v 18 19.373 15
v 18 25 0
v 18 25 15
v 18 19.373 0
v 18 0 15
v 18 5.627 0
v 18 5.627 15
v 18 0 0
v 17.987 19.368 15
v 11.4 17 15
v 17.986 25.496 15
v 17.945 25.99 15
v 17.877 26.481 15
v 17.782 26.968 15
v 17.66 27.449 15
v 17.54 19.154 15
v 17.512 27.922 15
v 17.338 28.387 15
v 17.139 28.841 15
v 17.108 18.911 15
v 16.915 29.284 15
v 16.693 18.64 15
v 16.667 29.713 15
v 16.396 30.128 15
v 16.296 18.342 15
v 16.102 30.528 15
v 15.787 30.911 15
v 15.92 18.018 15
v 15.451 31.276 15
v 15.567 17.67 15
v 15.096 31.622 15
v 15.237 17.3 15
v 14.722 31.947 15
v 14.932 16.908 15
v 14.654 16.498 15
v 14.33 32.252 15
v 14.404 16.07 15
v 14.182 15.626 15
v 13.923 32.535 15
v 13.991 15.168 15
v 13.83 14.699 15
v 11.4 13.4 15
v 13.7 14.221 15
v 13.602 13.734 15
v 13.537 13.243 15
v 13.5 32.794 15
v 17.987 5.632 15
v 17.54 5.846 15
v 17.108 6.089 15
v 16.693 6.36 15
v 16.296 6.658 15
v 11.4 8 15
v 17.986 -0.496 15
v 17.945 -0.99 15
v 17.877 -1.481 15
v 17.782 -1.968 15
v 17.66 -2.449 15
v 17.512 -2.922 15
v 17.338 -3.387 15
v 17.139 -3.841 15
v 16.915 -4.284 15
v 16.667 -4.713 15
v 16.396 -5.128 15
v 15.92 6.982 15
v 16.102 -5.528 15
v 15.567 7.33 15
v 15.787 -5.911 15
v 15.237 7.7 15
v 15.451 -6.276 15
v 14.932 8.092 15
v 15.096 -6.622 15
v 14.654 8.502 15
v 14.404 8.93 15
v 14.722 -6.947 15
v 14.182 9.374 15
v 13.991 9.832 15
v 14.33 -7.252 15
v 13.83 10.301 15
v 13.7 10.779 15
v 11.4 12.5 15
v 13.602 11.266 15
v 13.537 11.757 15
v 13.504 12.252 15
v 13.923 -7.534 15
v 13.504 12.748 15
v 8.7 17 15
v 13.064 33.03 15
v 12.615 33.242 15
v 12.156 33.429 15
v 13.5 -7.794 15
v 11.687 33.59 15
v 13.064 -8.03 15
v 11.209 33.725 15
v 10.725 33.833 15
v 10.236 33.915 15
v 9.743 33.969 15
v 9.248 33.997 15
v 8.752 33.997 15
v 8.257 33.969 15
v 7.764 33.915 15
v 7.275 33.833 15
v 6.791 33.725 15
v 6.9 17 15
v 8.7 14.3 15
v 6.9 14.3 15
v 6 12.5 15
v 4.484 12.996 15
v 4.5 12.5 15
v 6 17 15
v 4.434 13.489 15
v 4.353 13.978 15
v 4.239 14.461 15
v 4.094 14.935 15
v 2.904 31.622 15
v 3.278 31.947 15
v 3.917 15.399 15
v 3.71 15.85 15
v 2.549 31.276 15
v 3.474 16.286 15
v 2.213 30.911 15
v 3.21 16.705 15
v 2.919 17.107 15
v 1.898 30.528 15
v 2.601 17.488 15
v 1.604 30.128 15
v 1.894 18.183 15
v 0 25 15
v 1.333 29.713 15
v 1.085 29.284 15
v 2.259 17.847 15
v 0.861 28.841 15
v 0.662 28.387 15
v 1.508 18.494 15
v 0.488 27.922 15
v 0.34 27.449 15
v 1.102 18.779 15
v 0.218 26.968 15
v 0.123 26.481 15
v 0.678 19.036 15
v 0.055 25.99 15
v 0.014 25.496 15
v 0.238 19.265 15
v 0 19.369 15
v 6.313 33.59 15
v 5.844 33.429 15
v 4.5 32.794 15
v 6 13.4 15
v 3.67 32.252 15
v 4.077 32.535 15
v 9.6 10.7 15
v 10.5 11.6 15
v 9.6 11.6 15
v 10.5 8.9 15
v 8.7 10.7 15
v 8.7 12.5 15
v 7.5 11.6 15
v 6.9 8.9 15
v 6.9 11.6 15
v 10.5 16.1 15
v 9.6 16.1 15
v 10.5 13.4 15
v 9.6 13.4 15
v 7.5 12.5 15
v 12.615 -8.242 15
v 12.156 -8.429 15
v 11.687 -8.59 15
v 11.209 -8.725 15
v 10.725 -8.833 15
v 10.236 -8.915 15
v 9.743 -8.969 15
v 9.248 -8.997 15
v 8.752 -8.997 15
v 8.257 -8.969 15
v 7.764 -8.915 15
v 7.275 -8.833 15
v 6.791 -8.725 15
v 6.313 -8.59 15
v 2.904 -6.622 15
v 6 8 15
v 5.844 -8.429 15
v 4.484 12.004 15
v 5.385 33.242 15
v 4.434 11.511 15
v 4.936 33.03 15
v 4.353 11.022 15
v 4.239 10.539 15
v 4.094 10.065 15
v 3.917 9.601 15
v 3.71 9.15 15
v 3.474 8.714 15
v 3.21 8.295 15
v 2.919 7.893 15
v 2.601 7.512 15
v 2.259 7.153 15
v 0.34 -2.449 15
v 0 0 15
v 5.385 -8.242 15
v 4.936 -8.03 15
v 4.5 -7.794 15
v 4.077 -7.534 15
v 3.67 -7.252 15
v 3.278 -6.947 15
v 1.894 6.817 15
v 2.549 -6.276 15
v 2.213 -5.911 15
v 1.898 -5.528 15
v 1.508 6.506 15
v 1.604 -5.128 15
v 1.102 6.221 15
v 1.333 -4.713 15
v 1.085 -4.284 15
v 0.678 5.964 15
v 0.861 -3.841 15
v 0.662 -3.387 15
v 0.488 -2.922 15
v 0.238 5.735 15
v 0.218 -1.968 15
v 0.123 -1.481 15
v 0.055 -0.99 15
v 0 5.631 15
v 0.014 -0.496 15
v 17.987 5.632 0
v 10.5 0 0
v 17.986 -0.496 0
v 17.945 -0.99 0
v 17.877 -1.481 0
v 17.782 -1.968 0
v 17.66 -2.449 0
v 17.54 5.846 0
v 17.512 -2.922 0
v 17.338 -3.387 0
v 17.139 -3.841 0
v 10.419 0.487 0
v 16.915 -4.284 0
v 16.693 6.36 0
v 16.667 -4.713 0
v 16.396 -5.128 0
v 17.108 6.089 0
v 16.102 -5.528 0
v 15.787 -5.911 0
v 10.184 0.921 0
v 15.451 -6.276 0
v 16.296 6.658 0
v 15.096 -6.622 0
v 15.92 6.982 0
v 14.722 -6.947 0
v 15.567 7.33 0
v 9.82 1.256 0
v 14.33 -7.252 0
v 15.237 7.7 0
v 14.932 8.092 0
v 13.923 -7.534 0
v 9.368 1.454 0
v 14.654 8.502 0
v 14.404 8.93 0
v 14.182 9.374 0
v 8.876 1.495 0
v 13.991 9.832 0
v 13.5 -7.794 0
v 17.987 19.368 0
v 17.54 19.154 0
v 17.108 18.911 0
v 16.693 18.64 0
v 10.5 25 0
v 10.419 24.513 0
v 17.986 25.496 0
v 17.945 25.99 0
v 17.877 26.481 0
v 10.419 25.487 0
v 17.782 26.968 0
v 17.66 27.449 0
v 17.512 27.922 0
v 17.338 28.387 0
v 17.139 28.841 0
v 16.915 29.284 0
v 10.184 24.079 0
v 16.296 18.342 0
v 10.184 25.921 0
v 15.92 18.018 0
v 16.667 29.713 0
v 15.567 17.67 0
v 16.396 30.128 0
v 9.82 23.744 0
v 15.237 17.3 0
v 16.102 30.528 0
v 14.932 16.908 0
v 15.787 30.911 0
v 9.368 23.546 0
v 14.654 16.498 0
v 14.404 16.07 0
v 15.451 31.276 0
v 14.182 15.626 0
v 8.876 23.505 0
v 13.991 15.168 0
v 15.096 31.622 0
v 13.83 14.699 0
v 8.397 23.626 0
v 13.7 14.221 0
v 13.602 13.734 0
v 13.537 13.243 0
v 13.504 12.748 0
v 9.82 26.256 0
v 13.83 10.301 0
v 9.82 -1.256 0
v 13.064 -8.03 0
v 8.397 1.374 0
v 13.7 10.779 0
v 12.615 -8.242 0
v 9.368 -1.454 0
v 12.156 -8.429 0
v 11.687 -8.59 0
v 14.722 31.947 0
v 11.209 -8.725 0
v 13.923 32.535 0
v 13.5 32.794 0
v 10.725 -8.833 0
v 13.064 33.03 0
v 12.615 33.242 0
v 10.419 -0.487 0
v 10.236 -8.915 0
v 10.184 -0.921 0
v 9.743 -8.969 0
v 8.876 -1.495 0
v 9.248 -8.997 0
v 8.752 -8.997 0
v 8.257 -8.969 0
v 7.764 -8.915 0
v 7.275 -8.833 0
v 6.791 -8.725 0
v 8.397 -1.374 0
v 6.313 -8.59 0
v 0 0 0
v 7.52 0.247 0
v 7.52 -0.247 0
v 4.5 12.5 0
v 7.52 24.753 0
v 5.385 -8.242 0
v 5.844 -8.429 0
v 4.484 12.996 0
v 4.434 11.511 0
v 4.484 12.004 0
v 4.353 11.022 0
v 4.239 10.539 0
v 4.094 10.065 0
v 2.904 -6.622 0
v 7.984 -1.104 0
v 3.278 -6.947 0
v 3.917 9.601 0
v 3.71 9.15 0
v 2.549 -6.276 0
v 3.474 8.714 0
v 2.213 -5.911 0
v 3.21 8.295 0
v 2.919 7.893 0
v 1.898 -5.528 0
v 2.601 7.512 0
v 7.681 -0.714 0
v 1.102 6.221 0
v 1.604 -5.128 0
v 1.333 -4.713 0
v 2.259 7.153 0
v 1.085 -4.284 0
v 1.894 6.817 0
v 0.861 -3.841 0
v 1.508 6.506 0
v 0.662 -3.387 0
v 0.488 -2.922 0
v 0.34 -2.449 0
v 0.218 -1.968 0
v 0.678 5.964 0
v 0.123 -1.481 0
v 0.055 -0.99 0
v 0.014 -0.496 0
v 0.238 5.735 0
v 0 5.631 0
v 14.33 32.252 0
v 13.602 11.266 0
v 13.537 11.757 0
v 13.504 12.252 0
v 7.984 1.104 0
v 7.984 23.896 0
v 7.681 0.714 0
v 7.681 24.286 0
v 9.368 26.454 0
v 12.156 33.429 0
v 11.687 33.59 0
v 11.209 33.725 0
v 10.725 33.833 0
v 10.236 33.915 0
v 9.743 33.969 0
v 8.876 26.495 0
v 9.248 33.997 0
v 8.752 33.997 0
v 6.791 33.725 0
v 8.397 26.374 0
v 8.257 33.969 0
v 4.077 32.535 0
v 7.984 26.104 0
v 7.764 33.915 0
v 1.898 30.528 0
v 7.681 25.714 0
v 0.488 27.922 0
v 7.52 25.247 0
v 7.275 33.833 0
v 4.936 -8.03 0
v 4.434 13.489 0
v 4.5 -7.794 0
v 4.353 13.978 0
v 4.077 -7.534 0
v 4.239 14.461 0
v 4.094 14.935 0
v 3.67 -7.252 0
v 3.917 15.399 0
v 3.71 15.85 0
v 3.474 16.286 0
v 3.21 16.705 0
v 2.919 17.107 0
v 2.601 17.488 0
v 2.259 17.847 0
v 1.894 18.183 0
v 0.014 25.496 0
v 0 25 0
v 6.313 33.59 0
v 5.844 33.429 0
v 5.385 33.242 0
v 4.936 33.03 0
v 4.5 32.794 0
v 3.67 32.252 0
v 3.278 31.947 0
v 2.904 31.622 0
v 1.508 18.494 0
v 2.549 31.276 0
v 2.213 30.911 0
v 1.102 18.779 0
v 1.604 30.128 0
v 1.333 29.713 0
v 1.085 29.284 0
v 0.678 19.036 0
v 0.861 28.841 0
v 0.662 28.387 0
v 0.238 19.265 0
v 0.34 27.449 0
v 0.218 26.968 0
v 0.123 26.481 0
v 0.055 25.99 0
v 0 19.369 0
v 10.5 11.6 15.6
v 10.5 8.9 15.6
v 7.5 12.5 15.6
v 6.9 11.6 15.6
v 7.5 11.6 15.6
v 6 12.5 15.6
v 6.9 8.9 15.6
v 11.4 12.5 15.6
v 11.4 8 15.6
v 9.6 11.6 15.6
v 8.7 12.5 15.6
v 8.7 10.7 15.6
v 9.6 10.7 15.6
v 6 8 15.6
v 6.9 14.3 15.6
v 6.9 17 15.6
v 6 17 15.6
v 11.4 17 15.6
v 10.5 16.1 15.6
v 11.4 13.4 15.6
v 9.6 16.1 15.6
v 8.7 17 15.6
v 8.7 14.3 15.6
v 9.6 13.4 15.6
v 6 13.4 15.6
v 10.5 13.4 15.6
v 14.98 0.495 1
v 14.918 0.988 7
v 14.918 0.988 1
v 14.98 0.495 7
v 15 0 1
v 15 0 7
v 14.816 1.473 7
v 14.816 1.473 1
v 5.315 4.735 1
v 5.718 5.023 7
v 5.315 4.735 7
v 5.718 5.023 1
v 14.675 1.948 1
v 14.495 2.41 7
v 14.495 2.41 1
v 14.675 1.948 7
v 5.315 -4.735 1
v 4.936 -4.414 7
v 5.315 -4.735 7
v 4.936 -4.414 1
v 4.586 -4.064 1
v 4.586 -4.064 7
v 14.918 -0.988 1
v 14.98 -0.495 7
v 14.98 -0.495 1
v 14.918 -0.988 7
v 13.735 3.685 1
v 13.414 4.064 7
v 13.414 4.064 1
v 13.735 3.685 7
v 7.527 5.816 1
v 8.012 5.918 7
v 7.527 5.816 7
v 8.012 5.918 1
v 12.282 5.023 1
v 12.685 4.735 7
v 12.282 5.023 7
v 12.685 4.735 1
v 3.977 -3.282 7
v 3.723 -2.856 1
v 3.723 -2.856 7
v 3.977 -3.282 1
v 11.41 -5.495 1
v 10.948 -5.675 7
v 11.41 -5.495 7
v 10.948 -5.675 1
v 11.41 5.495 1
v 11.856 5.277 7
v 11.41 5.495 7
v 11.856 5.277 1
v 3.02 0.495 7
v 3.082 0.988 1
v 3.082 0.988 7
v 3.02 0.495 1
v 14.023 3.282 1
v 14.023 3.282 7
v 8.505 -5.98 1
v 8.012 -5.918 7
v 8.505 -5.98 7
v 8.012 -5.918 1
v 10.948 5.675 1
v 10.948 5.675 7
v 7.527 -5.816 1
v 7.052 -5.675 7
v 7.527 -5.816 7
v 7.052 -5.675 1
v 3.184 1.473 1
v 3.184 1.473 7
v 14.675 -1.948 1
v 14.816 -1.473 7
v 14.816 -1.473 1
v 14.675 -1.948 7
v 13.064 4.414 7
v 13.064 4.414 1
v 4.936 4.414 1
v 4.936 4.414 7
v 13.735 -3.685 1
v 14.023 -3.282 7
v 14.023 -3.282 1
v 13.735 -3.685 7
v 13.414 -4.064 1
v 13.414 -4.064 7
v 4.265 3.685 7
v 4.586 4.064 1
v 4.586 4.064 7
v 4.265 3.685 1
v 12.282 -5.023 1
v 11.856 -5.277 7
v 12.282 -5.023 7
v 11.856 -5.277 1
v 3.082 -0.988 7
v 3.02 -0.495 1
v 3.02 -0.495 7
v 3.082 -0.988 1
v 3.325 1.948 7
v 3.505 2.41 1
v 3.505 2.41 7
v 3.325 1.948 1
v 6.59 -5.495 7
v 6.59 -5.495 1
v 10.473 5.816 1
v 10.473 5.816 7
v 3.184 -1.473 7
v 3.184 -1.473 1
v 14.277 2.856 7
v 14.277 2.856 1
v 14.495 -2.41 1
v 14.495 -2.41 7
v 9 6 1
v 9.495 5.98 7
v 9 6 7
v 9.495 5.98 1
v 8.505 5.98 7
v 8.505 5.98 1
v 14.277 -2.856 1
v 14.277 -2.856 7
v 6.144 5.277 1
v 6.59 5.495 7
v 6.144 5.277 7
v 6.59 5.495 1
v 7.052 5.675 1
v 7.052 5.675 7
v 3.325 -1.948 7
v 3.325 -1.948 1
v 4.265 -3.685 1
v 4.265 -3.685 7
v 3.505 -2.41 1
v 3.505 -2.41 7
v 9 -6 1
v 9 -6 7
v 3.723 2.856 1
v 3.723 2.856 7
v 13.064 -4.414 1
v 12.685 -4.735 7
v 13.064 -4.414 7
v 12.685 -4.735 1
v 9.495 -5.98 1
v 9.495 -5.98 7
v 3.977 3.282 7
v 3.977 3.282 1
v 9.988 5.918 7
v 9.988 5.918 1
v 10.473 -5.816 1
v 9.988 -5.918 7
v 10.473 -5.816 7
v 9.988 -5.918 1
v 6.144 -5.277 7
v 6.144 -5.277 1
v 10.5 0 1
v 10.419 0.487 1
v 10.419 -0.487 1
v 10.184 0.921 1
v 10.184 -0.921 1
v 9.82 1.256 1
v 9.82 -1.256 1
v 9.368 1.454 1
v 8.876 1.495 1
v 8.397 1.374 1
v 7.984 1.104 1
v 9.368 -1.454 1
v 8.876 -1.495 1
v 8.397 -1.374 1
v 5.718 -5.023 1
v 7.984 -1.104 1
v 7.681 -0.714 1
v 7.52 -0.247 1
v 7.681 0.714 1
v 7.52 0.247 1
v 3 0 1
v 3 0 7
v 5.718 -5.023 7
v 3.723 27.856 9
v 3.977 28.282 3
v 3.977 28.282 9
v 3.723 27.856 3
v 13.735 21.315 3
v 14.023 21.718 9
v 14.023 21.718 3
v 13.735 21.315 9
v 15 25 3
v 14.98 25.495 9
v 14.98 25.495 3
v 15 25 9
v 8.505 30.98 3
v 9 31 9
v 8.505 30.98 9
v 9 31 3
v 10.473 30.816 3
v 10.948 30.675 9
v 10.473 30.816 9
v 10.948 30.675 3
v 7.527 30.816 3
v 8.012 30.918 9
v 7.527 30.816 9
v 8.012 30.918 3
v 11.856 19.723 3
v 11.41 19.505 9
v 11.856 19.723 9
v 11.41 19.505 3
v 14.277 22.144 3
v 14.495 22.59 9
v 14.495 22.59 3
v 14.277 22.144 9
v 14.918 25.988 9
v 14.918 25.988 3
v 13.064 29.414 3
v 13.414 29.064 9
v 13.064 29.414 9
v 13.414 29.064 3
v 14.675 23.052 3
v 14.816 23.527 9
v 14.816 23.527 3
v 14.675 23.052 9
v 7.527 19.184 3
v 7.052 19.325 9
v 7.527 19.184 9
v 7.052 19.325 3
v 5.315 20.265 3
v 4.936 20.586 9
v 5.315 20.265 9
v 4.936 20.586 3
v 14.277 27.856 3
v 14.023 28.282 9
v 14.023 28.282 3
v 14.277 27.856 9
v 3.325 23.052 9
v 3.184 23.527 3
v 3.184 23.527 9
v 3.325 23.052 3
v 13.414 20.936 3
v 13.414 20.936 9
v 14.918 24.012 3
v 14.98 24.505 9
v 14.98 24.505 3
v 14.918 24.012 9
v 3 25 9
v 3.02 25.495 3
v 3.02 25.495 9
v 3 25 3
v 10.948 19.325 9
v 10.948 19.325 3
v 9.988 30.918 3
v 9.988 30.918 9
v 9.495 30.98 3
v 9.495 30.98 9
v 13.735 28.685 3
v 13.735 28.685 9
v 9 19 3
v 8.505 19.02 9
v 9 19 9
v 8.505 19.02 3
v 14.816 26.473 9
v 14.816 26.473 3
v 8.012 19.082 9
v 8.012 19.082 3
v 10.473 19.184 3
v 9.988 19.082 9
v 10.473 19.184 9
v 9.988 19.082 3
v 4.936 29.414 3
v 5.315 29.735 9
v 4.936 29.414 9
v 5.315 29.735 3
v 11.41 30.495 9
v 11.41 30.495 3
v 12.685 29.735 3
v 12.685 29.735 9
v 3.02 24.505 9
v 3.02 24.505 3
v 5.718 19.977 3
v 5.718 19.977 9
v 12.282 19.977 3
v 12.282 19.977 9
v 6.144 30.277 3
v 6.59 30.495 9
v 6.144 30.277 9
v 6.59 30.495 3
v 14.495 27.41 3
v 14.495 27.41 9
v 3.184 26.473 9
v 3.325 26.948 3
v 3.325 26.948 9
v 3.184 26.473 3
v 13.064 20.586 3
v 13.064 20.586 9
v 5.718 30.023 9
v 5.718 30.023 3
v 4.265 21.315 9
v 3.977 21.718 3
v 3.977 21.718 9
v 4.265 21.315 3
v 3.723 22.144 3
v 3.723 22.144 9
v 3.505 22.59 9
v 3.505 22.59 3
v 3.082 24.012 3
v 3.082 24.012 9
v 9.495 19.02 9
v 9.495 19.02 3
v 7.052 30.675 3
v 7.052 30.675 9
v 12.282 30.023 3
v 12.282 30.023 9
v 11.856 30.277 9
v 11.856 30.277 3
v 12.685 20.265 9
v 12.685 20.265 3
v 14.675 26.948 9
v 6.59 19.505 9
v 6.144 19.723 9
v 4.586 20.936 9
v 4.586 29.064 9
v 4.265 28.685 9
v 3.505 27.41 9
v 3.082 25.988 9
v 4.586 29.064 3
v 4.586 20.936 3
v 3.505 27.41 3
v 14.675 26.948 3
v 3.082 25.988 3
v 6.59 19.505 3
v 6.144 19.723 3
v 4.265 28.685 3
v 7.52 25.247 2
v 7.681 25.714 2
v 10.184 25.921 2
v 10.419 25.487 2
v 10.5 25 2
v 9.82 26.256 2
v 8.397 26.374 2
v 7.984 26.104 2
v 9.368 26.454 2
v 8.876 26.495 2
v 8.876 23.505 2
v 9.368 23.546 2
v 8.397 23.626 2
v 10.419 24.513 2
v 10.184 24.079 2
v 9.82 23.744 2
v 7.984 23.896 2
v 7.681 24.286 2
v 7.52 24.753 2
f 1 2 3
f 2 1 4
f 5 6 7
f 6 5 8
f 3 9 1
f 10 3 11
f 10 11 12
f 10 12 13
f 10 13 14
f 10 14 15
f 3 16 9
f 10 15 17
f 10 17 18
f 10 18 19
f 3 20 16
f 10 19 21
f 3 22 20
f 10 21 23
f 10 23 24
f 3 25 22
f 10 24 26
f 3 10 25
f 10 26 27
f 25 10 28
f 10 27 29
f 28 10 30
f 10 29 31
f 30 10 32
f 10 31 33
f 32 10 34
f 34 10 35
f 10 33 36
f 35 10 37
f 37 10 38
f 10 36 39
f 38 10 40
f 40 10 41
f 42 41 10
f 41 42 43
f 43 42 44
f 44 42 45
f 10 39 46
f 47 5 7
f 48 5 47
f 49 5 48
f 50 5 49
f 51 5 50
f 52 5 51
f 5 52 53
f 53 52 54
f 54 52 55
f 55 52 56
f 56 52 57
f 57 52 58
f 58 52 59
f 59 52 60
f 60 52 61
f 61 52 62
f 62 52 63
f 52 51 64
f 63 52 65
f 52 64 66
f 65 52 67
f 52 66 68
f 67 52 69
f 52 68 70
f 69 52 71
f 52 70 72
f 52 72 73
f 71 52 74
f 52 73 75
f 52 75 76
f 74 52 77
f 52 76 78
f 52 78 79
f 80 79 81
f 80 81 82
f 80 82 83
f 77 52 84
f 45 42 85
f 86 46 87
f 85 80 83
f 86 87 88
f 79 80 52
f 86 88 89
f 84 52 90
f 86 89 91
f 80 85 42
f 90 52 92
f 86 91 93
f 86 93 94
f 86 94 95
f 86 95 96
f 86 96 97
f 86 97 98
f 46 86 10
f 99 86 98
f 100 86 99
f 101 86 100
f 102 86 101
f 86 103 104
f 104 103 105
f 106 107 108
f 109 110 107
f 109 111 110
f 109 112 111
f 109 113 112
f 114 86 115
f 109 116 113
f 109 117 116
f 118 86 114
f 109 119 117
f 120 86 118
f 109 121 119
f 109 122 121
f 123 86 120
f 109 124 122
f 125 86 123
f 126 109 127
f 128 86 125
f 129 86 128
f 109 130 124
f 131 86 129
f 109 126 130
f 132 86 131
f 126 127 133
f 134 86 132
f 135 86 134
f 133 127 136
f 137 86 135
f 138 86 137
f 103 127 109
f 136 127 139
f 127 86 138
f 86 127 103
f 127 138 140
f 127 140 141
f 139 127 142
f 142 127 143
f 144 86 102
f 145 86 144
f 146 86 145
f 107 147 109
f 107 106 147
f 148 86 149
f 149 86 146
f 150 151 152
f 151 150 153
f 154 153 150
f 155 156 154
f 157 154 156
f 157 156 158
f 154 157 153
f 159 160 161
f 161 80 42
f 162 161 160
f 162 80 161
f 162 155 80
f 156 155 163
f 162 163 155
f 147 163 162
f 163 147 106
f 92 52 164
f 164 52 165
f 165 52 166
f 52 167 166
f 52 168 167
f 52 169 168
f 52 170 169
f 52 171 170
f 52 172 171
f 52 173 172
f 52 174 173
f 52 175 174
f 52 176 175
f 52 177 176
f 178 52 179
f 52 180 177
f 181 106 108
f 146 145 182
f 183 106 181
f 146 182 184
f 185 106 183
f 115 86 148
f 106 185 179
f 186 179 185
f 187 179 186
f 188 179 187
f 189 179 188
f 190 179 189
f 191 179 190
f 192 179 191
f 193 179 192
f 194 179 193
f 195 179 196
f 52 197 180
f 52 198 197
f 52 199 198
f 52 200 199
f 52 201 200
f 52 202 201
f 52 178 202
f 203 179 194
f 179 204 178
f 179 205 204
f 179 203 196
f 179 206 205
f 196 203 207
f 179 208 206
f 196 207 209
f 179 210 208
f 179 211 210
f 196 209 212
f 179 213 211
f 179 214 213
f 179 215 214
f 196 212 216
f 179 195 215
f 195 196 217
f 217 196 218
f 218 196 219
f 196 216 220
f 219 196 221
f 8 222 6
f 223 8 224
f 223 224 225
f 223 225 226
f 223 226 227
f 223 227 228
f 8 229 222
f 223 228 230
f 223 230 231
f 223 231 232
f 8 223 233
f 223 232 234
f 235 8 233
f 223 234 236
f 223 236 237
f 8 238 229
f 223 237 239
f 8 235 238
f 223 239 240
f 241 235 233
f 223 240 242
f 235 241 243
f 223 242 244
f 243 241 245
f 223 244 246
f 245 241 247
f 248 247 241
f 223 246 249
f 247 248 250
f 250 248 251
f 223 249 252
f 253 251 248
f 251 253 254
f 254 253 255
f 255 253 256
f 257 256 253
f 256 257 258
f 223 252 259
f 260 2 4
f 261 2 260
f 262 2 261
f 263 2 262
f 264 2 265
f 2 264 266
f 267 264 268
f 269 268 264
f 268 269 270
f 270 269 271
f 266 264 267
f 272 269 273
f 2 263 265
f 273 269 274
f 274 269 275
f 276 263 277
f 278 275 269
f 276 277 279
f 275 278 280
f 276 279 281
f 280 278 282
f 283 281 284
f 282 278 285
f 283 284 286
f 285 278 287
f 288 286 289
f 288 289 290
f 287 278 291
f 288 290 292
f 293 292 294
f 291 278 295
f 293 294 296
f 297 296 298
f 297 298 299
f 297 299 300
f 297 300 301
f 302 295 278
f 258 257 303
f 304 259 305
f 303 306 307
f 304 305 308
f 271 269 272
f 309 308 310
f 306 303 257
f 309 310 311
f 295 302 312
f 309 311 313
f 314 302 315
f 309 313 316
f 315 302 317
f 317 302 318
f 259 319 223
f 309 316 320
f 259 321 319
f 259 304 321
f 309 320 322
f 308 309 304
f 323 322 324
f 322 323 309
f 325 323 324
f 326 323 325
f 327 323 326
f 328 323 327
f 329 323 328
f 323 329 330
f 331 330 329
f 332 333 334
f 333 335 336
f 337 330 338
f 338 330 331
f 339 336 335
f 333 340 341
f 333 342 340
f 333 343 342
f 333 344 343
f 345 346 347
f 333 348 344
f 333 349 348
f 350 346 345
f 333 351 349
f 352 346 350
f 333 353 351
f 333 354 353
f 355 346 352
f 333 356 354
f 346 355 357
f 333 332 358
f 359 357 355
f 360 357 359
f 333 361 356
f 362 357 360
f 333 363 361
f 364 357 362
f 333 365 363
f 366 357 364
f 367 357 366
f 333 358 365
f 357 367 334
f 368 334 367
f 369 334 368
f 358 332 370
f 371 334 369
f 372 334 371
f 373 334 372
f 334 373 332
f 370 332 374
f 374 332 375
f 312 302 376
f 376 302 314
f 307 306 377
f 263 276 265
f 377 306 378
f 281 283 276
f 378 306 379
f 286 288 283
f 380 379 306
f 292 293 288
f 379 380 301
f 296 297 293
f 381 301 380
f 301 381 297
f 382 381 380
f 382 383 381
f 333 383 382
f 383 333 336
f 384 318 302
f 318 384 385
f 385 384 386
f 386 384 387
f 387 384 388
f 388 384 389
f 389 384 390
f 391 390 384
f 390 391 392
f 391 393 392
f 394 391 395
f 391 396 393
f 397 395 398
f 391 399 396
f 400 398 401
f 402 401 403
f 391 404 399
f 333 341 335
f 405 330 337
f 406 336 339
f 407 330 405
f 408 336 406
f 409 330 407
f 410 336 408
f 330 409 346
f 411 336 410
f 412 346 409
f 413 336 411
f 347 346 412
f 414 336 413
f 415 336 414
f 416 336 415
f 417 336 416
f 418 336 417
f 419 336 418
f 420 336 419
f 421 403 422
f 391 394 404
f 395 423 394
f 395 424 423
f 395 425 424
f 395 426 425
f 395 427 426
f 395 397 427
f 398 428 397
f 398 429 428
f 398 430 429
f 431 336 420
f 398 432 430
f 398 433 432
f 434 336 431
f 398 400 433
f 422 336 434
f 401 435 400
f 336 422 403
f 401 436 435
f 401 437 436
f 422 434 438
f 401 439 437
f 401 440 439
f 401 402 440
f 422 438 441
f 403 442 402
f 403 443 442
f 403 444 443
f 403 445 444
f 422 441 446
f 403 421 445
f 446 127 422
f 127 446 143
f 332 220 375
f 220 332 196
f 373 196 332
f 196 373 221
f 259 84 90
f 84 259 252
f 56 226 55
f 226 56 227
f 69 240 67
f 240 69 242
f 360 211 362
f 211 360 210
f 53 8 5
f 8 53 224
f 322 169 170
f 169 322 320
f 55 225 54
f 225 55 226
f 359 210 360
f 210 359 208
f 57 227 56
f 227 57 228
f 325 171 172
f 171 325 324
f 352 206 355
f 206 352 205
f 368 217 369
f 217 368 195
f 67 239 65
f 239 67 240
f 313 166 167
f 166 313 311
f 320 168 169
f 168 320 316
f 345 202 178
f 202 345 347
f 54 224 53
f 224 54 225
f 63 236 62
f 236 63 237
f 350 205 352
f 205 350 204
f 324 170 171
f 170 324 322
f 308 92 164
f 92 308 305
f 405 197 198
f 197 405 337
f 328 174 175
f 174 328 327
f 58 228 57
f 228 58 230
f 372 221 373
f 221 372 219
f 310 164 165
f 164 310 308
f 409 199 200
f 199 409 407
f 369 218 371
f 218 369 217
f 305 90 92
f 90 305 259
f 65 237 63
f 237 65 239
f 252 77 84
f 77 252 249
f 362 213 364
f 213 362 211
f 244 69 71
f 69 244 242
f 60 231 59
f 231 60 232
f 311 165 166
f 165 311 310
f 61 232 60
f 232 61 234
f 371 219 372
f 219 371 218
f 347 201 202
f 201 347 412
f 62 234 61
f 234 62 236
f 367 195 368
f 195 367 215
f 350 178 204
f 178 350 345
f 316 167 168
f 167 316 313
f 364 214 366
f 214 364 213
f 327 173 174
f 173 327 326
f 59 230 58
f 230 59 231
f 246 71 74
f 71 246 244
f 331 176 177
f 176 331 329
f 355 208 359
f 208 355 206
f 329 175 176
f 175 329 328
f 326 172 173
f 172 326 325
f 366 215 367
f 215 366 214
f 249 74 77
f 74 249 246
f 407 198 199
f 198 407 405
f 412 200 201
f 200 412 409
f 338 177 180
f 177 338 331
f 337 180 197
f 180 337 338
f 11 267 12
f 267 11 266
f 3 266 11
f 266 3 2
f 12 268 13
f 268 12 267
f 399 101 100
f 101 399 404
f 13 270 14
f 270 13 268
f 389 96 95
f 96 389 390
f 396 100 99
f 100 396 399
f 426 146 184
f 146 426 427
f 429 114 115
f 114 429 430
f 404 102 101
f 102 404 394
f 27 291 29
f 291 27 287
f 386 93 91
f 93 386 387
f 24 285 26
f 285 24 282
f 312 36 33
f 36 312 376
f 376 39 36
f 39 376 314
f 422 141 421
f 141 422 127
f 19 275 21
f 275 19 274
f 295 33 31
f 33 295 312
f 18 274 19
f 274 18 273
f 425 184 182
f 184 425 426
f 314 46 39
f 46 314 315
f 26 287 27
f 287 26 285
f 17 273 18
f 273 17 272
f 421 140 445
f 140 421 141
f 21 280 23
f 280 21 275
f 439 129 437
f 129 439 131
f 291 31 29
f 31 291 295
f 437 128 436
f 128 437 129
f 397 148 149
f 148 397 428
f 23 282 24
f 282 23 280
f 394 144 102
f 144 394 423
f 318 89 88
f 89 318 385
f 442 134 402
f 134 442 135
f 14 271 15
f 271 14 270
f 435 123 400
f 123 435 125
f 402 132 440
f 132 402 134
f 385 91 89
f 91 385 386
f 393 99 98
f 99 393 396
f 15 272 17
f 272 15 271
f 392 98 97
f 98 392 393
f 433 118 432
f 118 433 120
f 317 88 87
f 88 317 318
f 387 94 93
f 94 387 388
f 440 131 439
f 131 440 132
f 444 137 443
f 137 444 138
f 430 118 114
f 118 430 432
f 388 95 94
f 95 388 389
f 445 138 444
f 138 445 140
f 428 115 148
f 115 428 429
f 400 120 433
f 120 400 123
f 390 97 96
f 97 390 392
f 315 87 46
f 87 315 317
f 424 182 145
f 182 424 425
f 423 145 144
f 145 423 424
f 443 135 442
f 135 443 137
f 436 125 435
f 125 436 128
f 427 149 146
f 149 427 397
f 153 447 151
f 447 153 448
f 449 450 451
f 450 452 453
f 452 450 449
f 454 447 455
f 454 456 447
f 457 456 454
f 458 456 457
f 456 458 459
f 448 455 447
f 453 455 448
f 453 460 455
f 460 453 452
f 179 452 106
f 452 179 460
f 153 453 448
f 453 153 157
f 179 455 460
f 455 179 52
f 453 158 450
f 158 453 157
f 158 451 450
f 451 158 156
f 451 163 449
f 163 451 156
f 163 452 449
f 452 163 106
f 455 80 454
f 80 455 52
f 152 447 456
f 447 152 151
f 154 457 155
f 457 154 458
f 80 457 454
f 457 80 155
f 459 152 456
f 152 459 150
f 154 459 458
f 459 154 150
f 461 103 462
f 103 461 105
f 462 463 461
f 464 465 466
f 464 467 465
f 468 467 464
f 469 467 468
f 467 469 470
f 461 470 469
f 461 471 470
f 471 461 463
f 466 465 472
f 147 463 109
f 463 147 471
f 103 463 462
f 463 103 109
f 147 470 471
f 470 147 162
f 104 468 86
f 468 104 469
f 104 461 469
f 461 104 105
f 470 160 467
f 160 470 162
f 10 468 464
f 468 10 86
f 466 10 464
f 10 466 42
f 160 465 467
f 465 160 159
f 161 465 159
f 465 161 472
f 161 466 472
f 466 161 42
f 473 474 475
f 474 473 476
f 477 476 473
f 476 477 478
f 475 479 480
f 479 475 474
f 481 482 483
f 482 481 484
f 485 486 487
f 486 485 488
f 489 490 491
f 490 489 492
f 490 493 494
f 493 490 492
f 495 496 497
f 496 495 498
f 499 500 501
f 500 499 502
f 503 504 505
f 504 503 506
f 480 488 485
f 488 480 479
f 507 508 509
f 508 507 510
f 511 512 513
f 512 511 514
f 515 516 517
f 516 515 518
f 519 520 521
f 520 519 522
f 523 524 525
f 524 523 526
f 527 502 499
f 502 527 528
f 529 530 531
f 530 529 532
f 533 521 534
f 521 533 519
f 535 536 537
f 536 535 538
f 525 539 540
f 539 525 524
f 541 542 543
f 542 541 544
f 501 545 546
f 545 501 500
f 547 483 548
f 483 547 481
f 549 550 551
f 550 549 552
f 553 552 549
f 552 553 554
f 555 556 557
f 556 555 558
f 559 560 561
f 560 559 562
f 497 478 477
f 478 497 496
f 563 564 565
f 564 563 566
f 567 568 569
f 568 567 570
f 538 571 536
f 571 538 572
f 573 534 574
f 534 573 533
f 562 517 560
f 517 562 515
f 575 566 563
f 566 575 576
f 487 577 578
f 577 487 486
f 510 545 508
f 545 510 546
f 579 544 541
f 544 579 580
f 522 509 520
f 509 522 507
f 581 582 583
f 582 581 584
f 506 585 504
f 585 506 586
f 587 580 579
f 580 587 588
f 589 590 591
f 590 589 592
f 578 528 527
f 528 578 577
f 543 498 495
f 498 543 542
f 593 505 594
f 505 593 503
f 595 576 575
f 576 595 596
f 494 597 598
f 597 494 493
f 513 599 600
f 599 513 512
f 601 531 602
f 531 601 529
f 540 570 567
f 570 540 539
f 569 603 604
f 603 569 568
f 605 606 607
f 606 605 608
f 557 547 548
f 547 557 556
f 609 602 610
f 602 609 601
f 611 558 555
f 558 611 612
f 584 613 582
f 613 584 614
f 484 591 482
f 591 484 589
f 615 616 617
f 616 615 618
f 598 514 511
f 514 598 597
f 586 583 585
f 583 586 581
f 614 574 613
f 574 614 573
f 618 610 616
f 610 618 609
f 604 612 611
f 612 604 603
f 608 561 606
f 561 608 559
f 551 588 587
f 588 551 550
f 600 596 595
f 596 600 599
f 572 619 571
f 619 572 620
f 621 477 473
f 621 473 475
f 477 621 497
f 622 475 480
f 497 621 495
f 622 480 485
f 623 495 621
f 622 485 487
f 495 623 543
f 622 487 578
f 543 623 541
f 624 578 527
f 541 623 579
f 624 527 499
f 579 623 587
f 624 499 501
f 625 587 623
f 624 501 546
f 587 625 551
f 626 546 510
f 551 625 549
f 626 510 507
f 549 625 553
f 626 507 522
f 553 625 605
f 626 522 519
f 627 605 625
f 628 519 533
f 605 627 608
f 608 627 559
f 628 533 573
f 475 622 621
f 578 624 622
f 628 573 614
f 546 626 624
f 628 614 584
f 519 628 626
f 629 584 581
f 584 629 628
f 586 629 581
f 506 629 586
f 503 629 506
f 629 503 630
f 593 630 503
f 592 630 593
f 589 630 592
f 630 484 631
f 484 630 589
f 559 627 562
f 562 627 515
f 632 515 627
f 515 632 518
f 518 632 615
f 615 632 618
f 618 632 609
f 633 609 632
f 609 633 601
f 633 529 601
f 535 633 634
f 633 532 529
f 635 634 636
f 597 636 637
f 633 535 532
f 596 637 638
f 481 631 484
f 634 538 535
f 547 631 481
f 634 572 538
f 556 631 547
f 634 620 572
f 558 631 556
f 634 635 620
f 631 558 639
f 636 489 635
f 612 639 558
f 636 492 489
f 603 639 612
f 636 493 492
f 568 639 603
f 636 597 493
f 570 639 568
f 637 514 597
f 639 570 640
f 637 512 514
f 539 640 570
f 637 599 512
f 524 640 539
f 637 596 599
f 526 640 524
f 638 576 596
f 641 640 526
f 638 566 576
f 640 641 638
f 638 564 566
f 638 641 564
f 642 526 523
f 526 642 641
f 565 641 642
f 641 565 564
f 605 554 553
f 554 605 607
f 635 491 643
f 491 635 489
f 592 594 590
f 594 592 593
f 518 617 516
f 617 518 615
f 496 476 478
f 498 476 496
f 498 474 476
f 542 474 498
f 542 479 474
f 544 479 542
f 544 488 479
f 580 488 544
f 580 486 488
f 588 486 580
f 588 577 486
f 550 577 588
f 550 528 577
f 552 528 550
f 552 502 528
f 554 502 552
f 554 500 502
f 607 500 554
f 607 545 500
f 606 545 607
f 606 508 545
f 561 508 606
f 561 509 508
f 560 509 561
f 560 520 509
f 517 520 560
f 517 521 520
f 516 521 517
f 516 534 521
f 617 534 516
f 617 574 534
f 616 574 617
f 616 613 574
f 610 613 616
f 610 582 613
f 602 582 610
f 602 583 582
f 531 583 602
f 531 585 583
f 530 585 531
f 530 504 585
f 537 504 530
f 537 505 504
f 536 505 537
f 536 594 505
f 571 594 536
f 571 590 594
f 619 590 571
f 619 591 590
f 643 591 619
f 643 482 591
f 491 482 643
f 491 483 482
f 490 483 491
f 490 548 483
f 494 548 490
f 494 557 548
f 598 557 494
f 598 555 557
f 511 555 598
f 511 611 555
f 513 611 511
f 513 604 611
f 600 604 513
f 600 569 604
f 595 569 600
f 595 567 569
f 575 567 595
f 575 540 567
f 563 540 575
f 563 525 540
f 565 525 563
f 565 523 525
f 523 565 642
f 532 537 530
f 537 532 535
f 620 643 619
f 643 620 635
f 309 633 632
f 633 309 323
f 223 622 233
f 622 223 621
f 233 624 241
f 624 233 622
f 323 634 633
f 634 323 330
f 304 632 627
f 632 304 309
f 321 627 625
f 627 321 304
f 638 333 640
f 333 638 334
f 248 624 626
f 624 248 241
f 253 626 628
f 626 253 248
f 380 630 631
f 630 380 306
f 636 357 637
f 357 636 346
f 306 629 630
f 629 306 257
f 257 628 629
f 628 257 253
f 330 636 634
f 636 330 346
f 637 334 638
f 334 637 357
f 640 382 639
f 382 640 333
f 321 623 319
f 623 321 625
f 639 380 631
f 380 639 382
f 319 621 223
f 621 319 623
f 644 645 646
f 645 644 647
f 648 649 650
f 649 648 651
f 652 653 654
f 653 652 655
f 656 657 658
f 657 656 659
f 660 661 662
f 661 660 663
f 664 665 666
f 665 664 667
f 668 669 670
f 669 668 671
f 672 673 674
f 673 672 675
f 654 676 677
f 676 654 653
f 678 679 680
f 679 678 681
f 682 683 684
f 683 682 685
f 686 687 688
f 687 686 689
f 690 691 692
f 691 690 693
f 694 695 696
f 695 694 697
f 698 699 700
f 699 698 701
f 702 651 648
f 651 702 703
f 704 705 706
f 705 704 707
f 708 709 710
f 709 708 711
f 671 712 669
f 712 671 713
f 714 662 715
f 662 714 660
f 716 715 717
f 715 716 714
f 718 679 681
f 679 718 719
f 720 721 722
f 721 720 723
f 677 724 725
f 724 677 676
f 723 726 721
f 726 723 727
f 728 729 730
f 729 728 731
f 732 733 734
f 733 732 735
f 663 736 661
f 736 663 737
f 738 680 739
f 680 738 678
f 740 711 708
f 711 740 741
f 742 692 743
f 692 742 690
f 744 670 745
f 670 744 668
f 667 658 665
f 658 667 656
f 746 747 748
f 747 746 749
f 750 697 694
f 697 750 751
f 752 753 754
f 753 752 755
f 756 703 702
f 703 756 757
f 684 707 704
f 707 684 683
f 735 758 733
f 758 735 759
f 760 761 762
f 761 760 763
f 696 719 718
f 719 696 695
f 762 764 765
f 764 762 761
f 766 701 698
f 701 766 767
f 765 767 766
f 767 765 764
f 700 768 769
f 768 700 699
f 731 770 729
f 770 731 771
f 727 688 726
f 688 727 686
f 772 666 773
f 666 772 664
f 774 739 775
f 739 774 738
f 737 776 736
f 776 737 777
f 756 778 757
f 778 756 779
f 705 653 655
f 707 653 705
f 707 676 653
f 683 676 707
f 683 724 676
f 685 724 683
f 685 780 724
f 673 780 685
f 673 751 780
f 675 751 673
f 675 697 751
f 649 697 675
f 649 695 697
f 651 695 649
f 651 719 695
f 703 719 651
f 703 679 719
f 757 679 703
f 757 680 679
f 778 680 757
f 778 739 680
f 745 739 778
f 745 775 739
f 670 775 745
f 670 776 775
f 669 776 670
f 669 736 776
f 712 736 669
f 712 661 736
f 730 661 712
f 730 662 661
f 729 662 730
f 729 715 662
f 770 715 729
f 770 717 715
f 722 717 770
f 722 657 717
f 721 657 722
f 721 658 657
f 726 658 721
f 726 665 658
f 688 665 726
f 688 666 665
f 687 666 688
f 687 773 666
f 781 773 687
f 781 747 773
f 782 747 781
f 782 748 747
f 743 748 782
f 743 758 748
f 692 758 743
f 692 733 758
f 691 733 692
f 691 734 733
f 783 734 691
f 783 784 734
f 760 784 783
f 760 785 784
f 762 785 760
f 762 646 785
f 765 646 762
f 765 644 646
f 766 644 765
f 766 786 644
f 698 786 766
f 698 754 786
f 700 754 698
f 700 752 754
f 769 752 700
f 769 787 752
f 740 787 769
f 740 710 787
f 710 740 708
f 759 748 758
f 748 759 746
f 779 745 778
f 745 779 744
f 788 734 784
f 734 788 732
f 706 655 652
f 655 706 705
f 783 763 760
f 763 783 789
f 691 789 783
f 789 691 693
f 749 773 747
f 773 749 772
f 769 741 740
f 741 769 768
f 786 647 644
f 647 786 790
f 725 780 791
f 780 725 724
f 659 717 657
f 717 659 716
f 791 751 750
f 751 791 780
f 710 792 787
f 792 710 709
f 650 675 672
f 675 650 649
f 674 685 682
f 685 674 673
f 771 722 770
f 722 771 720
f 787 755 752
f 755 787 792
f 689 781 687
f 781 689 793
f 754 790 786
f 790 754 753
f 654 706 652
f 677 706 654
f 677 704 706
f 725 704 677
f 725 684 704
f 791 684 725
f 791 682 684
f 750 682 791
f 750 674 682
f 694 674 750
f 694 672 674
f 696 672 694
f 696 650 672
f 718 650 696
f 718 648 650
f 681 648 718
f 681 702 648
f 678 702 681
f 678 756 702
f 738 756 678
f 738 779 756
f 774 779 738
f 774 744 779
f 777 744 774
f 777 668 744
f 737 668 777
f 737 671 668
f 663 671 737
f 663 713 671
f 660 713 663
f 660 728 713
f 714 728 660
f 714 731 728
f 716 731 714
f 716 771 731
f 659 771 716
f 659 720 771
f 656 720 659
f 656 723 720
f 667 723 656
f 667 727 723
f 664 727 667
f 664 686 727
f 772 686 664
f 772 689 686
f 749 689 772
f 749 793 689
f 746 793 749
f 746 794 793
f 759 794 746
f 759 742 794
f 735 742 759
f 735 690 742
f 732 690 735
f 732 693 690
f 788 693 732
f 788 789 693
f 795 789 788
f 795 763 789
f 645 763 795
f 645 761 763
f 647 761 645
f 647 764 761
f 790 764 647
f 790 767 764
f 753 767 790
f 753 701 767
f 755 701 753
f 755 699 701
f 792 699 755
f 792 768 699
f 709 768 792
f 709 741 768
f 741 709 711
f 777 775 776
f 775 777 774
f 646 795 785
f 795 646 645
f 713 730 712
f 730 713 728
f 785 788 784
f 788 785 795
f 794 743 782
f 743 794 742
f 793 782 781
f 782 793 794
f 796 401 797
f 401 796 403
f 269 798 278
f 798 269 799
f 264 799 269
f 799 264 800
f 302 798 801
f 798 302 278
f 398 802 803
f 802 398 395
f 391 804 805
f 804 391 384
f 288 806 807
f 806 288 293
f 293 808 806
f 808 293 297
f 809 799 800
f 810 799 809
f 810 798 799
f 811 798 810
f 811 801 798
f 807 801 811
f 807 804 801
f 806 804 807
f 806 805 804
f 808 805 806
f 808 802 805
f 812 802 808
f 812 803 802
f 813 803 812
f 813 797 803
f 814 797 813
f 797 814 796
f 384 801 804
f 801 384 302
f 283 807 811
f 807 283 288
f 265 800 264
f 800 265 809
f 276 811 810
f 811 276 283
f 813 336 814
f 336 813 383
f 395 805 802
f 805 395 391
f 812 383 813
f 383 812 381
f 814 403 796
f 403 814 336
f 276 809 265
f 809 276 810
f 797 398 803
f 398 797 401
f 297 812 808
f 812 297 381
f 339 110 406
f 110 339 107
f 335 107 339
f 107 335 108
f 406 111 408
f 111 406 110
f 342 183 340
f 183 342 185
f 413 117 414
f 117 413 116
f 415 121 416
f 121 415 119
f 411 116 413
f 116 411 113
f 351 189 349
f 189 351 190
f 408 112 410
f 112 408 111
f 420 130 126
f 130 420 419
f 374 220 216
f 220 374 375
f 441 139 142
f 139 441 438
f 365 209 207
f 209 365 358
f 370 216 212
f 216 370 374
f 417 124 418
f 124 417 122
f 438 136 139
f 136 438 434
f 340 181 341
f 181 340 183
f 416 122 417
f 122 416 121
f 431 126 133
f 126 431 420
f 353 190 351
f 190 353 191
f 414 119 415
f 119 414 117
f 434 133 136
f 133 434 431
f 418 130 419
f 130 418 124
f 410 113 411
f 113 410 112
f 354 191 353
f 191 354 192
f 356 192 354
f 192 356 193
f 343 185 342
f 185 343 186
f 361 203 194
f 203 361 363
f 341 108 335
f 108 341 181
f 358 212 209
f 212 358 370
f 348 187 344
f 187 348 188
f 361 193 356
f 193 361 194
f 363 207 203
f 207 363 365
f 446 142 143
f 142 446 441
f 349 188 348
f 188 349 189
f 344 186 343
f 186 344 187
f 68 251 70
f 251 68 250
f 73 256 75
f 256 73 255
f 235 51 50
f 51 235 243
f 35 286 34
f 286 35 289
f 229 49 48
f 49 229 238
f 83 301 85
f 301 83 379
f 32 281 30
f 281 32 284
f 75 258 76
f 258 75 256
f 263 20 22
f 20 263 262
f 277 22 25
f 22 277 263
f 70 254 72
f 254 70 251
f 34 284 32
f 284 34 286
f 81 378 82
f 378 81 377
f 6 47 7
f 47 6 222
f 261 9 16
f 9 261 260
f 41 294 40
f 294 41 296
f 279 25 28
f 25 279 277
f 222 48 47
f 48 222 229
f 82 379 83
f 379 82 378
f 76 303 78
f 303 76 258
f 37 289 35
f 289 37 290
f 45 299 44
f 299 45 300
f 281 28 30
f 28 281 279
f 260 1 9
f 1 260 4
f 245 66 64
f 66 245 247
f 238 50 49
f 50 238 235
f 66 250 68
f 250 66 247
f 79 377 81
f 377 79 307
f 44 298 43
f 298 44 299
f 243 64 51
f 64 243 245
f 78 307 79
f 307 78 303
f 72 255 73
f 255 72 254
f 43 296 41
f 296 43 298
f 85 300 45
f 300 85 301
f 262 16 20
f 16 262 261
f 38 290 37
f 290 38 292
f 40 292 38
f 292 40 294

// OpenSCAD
$fa=.5;
$fs=.5;
magnet_height=6; //[1:11]
magnet_diameter=12; //[1:17]
module GSLogo(){
cube([15,3,2]);   //The G
cube([3,12,2]);
translate([0,12,0])cube([5,3,2]);
translate([15,0,0])cube([3,12,2]);
translate([9,12,0])cube([9,3,2]);
translate([9,9,0])cube([3,5,2]);
	translate([0,18,0])cube([3,12,2]);  //The S
	translate([0,18,0])cube([9,3,2]);
	translate([9,18,0])cube([3,12,2]);
	translate([9,27,0])cube([9,3,2]);
	translate([15,18,0])cube([3,12,2]);
}


difference()
{
	union()
	{
	color("blue"){
	cube([18,25,15]);
	translate([9,0,0])cylinder(h=15,r=9);
	translate([9,25,0])cylinder(h=15,r=9);
	}
	color("red")translate([6,8,15])scale(v=[.3,.3,.3])GSLogo();
	
}
translate([9,0,1])cylinder(h=magnet_height,d=magnet_diameter);
translate([9,0,-1])cylinder(h=3,d=3);
translate([9,25,3])cylinder(h=magnet_height,d=magnet_diameter);
translate([9,25,-1])cylinder(h=3,d=3);
translate([-3,12.5,-1])cylinder(h=17, r=7.5);
translate([21,12.5,-1])cylinder(h=17, r=7.5);
}
